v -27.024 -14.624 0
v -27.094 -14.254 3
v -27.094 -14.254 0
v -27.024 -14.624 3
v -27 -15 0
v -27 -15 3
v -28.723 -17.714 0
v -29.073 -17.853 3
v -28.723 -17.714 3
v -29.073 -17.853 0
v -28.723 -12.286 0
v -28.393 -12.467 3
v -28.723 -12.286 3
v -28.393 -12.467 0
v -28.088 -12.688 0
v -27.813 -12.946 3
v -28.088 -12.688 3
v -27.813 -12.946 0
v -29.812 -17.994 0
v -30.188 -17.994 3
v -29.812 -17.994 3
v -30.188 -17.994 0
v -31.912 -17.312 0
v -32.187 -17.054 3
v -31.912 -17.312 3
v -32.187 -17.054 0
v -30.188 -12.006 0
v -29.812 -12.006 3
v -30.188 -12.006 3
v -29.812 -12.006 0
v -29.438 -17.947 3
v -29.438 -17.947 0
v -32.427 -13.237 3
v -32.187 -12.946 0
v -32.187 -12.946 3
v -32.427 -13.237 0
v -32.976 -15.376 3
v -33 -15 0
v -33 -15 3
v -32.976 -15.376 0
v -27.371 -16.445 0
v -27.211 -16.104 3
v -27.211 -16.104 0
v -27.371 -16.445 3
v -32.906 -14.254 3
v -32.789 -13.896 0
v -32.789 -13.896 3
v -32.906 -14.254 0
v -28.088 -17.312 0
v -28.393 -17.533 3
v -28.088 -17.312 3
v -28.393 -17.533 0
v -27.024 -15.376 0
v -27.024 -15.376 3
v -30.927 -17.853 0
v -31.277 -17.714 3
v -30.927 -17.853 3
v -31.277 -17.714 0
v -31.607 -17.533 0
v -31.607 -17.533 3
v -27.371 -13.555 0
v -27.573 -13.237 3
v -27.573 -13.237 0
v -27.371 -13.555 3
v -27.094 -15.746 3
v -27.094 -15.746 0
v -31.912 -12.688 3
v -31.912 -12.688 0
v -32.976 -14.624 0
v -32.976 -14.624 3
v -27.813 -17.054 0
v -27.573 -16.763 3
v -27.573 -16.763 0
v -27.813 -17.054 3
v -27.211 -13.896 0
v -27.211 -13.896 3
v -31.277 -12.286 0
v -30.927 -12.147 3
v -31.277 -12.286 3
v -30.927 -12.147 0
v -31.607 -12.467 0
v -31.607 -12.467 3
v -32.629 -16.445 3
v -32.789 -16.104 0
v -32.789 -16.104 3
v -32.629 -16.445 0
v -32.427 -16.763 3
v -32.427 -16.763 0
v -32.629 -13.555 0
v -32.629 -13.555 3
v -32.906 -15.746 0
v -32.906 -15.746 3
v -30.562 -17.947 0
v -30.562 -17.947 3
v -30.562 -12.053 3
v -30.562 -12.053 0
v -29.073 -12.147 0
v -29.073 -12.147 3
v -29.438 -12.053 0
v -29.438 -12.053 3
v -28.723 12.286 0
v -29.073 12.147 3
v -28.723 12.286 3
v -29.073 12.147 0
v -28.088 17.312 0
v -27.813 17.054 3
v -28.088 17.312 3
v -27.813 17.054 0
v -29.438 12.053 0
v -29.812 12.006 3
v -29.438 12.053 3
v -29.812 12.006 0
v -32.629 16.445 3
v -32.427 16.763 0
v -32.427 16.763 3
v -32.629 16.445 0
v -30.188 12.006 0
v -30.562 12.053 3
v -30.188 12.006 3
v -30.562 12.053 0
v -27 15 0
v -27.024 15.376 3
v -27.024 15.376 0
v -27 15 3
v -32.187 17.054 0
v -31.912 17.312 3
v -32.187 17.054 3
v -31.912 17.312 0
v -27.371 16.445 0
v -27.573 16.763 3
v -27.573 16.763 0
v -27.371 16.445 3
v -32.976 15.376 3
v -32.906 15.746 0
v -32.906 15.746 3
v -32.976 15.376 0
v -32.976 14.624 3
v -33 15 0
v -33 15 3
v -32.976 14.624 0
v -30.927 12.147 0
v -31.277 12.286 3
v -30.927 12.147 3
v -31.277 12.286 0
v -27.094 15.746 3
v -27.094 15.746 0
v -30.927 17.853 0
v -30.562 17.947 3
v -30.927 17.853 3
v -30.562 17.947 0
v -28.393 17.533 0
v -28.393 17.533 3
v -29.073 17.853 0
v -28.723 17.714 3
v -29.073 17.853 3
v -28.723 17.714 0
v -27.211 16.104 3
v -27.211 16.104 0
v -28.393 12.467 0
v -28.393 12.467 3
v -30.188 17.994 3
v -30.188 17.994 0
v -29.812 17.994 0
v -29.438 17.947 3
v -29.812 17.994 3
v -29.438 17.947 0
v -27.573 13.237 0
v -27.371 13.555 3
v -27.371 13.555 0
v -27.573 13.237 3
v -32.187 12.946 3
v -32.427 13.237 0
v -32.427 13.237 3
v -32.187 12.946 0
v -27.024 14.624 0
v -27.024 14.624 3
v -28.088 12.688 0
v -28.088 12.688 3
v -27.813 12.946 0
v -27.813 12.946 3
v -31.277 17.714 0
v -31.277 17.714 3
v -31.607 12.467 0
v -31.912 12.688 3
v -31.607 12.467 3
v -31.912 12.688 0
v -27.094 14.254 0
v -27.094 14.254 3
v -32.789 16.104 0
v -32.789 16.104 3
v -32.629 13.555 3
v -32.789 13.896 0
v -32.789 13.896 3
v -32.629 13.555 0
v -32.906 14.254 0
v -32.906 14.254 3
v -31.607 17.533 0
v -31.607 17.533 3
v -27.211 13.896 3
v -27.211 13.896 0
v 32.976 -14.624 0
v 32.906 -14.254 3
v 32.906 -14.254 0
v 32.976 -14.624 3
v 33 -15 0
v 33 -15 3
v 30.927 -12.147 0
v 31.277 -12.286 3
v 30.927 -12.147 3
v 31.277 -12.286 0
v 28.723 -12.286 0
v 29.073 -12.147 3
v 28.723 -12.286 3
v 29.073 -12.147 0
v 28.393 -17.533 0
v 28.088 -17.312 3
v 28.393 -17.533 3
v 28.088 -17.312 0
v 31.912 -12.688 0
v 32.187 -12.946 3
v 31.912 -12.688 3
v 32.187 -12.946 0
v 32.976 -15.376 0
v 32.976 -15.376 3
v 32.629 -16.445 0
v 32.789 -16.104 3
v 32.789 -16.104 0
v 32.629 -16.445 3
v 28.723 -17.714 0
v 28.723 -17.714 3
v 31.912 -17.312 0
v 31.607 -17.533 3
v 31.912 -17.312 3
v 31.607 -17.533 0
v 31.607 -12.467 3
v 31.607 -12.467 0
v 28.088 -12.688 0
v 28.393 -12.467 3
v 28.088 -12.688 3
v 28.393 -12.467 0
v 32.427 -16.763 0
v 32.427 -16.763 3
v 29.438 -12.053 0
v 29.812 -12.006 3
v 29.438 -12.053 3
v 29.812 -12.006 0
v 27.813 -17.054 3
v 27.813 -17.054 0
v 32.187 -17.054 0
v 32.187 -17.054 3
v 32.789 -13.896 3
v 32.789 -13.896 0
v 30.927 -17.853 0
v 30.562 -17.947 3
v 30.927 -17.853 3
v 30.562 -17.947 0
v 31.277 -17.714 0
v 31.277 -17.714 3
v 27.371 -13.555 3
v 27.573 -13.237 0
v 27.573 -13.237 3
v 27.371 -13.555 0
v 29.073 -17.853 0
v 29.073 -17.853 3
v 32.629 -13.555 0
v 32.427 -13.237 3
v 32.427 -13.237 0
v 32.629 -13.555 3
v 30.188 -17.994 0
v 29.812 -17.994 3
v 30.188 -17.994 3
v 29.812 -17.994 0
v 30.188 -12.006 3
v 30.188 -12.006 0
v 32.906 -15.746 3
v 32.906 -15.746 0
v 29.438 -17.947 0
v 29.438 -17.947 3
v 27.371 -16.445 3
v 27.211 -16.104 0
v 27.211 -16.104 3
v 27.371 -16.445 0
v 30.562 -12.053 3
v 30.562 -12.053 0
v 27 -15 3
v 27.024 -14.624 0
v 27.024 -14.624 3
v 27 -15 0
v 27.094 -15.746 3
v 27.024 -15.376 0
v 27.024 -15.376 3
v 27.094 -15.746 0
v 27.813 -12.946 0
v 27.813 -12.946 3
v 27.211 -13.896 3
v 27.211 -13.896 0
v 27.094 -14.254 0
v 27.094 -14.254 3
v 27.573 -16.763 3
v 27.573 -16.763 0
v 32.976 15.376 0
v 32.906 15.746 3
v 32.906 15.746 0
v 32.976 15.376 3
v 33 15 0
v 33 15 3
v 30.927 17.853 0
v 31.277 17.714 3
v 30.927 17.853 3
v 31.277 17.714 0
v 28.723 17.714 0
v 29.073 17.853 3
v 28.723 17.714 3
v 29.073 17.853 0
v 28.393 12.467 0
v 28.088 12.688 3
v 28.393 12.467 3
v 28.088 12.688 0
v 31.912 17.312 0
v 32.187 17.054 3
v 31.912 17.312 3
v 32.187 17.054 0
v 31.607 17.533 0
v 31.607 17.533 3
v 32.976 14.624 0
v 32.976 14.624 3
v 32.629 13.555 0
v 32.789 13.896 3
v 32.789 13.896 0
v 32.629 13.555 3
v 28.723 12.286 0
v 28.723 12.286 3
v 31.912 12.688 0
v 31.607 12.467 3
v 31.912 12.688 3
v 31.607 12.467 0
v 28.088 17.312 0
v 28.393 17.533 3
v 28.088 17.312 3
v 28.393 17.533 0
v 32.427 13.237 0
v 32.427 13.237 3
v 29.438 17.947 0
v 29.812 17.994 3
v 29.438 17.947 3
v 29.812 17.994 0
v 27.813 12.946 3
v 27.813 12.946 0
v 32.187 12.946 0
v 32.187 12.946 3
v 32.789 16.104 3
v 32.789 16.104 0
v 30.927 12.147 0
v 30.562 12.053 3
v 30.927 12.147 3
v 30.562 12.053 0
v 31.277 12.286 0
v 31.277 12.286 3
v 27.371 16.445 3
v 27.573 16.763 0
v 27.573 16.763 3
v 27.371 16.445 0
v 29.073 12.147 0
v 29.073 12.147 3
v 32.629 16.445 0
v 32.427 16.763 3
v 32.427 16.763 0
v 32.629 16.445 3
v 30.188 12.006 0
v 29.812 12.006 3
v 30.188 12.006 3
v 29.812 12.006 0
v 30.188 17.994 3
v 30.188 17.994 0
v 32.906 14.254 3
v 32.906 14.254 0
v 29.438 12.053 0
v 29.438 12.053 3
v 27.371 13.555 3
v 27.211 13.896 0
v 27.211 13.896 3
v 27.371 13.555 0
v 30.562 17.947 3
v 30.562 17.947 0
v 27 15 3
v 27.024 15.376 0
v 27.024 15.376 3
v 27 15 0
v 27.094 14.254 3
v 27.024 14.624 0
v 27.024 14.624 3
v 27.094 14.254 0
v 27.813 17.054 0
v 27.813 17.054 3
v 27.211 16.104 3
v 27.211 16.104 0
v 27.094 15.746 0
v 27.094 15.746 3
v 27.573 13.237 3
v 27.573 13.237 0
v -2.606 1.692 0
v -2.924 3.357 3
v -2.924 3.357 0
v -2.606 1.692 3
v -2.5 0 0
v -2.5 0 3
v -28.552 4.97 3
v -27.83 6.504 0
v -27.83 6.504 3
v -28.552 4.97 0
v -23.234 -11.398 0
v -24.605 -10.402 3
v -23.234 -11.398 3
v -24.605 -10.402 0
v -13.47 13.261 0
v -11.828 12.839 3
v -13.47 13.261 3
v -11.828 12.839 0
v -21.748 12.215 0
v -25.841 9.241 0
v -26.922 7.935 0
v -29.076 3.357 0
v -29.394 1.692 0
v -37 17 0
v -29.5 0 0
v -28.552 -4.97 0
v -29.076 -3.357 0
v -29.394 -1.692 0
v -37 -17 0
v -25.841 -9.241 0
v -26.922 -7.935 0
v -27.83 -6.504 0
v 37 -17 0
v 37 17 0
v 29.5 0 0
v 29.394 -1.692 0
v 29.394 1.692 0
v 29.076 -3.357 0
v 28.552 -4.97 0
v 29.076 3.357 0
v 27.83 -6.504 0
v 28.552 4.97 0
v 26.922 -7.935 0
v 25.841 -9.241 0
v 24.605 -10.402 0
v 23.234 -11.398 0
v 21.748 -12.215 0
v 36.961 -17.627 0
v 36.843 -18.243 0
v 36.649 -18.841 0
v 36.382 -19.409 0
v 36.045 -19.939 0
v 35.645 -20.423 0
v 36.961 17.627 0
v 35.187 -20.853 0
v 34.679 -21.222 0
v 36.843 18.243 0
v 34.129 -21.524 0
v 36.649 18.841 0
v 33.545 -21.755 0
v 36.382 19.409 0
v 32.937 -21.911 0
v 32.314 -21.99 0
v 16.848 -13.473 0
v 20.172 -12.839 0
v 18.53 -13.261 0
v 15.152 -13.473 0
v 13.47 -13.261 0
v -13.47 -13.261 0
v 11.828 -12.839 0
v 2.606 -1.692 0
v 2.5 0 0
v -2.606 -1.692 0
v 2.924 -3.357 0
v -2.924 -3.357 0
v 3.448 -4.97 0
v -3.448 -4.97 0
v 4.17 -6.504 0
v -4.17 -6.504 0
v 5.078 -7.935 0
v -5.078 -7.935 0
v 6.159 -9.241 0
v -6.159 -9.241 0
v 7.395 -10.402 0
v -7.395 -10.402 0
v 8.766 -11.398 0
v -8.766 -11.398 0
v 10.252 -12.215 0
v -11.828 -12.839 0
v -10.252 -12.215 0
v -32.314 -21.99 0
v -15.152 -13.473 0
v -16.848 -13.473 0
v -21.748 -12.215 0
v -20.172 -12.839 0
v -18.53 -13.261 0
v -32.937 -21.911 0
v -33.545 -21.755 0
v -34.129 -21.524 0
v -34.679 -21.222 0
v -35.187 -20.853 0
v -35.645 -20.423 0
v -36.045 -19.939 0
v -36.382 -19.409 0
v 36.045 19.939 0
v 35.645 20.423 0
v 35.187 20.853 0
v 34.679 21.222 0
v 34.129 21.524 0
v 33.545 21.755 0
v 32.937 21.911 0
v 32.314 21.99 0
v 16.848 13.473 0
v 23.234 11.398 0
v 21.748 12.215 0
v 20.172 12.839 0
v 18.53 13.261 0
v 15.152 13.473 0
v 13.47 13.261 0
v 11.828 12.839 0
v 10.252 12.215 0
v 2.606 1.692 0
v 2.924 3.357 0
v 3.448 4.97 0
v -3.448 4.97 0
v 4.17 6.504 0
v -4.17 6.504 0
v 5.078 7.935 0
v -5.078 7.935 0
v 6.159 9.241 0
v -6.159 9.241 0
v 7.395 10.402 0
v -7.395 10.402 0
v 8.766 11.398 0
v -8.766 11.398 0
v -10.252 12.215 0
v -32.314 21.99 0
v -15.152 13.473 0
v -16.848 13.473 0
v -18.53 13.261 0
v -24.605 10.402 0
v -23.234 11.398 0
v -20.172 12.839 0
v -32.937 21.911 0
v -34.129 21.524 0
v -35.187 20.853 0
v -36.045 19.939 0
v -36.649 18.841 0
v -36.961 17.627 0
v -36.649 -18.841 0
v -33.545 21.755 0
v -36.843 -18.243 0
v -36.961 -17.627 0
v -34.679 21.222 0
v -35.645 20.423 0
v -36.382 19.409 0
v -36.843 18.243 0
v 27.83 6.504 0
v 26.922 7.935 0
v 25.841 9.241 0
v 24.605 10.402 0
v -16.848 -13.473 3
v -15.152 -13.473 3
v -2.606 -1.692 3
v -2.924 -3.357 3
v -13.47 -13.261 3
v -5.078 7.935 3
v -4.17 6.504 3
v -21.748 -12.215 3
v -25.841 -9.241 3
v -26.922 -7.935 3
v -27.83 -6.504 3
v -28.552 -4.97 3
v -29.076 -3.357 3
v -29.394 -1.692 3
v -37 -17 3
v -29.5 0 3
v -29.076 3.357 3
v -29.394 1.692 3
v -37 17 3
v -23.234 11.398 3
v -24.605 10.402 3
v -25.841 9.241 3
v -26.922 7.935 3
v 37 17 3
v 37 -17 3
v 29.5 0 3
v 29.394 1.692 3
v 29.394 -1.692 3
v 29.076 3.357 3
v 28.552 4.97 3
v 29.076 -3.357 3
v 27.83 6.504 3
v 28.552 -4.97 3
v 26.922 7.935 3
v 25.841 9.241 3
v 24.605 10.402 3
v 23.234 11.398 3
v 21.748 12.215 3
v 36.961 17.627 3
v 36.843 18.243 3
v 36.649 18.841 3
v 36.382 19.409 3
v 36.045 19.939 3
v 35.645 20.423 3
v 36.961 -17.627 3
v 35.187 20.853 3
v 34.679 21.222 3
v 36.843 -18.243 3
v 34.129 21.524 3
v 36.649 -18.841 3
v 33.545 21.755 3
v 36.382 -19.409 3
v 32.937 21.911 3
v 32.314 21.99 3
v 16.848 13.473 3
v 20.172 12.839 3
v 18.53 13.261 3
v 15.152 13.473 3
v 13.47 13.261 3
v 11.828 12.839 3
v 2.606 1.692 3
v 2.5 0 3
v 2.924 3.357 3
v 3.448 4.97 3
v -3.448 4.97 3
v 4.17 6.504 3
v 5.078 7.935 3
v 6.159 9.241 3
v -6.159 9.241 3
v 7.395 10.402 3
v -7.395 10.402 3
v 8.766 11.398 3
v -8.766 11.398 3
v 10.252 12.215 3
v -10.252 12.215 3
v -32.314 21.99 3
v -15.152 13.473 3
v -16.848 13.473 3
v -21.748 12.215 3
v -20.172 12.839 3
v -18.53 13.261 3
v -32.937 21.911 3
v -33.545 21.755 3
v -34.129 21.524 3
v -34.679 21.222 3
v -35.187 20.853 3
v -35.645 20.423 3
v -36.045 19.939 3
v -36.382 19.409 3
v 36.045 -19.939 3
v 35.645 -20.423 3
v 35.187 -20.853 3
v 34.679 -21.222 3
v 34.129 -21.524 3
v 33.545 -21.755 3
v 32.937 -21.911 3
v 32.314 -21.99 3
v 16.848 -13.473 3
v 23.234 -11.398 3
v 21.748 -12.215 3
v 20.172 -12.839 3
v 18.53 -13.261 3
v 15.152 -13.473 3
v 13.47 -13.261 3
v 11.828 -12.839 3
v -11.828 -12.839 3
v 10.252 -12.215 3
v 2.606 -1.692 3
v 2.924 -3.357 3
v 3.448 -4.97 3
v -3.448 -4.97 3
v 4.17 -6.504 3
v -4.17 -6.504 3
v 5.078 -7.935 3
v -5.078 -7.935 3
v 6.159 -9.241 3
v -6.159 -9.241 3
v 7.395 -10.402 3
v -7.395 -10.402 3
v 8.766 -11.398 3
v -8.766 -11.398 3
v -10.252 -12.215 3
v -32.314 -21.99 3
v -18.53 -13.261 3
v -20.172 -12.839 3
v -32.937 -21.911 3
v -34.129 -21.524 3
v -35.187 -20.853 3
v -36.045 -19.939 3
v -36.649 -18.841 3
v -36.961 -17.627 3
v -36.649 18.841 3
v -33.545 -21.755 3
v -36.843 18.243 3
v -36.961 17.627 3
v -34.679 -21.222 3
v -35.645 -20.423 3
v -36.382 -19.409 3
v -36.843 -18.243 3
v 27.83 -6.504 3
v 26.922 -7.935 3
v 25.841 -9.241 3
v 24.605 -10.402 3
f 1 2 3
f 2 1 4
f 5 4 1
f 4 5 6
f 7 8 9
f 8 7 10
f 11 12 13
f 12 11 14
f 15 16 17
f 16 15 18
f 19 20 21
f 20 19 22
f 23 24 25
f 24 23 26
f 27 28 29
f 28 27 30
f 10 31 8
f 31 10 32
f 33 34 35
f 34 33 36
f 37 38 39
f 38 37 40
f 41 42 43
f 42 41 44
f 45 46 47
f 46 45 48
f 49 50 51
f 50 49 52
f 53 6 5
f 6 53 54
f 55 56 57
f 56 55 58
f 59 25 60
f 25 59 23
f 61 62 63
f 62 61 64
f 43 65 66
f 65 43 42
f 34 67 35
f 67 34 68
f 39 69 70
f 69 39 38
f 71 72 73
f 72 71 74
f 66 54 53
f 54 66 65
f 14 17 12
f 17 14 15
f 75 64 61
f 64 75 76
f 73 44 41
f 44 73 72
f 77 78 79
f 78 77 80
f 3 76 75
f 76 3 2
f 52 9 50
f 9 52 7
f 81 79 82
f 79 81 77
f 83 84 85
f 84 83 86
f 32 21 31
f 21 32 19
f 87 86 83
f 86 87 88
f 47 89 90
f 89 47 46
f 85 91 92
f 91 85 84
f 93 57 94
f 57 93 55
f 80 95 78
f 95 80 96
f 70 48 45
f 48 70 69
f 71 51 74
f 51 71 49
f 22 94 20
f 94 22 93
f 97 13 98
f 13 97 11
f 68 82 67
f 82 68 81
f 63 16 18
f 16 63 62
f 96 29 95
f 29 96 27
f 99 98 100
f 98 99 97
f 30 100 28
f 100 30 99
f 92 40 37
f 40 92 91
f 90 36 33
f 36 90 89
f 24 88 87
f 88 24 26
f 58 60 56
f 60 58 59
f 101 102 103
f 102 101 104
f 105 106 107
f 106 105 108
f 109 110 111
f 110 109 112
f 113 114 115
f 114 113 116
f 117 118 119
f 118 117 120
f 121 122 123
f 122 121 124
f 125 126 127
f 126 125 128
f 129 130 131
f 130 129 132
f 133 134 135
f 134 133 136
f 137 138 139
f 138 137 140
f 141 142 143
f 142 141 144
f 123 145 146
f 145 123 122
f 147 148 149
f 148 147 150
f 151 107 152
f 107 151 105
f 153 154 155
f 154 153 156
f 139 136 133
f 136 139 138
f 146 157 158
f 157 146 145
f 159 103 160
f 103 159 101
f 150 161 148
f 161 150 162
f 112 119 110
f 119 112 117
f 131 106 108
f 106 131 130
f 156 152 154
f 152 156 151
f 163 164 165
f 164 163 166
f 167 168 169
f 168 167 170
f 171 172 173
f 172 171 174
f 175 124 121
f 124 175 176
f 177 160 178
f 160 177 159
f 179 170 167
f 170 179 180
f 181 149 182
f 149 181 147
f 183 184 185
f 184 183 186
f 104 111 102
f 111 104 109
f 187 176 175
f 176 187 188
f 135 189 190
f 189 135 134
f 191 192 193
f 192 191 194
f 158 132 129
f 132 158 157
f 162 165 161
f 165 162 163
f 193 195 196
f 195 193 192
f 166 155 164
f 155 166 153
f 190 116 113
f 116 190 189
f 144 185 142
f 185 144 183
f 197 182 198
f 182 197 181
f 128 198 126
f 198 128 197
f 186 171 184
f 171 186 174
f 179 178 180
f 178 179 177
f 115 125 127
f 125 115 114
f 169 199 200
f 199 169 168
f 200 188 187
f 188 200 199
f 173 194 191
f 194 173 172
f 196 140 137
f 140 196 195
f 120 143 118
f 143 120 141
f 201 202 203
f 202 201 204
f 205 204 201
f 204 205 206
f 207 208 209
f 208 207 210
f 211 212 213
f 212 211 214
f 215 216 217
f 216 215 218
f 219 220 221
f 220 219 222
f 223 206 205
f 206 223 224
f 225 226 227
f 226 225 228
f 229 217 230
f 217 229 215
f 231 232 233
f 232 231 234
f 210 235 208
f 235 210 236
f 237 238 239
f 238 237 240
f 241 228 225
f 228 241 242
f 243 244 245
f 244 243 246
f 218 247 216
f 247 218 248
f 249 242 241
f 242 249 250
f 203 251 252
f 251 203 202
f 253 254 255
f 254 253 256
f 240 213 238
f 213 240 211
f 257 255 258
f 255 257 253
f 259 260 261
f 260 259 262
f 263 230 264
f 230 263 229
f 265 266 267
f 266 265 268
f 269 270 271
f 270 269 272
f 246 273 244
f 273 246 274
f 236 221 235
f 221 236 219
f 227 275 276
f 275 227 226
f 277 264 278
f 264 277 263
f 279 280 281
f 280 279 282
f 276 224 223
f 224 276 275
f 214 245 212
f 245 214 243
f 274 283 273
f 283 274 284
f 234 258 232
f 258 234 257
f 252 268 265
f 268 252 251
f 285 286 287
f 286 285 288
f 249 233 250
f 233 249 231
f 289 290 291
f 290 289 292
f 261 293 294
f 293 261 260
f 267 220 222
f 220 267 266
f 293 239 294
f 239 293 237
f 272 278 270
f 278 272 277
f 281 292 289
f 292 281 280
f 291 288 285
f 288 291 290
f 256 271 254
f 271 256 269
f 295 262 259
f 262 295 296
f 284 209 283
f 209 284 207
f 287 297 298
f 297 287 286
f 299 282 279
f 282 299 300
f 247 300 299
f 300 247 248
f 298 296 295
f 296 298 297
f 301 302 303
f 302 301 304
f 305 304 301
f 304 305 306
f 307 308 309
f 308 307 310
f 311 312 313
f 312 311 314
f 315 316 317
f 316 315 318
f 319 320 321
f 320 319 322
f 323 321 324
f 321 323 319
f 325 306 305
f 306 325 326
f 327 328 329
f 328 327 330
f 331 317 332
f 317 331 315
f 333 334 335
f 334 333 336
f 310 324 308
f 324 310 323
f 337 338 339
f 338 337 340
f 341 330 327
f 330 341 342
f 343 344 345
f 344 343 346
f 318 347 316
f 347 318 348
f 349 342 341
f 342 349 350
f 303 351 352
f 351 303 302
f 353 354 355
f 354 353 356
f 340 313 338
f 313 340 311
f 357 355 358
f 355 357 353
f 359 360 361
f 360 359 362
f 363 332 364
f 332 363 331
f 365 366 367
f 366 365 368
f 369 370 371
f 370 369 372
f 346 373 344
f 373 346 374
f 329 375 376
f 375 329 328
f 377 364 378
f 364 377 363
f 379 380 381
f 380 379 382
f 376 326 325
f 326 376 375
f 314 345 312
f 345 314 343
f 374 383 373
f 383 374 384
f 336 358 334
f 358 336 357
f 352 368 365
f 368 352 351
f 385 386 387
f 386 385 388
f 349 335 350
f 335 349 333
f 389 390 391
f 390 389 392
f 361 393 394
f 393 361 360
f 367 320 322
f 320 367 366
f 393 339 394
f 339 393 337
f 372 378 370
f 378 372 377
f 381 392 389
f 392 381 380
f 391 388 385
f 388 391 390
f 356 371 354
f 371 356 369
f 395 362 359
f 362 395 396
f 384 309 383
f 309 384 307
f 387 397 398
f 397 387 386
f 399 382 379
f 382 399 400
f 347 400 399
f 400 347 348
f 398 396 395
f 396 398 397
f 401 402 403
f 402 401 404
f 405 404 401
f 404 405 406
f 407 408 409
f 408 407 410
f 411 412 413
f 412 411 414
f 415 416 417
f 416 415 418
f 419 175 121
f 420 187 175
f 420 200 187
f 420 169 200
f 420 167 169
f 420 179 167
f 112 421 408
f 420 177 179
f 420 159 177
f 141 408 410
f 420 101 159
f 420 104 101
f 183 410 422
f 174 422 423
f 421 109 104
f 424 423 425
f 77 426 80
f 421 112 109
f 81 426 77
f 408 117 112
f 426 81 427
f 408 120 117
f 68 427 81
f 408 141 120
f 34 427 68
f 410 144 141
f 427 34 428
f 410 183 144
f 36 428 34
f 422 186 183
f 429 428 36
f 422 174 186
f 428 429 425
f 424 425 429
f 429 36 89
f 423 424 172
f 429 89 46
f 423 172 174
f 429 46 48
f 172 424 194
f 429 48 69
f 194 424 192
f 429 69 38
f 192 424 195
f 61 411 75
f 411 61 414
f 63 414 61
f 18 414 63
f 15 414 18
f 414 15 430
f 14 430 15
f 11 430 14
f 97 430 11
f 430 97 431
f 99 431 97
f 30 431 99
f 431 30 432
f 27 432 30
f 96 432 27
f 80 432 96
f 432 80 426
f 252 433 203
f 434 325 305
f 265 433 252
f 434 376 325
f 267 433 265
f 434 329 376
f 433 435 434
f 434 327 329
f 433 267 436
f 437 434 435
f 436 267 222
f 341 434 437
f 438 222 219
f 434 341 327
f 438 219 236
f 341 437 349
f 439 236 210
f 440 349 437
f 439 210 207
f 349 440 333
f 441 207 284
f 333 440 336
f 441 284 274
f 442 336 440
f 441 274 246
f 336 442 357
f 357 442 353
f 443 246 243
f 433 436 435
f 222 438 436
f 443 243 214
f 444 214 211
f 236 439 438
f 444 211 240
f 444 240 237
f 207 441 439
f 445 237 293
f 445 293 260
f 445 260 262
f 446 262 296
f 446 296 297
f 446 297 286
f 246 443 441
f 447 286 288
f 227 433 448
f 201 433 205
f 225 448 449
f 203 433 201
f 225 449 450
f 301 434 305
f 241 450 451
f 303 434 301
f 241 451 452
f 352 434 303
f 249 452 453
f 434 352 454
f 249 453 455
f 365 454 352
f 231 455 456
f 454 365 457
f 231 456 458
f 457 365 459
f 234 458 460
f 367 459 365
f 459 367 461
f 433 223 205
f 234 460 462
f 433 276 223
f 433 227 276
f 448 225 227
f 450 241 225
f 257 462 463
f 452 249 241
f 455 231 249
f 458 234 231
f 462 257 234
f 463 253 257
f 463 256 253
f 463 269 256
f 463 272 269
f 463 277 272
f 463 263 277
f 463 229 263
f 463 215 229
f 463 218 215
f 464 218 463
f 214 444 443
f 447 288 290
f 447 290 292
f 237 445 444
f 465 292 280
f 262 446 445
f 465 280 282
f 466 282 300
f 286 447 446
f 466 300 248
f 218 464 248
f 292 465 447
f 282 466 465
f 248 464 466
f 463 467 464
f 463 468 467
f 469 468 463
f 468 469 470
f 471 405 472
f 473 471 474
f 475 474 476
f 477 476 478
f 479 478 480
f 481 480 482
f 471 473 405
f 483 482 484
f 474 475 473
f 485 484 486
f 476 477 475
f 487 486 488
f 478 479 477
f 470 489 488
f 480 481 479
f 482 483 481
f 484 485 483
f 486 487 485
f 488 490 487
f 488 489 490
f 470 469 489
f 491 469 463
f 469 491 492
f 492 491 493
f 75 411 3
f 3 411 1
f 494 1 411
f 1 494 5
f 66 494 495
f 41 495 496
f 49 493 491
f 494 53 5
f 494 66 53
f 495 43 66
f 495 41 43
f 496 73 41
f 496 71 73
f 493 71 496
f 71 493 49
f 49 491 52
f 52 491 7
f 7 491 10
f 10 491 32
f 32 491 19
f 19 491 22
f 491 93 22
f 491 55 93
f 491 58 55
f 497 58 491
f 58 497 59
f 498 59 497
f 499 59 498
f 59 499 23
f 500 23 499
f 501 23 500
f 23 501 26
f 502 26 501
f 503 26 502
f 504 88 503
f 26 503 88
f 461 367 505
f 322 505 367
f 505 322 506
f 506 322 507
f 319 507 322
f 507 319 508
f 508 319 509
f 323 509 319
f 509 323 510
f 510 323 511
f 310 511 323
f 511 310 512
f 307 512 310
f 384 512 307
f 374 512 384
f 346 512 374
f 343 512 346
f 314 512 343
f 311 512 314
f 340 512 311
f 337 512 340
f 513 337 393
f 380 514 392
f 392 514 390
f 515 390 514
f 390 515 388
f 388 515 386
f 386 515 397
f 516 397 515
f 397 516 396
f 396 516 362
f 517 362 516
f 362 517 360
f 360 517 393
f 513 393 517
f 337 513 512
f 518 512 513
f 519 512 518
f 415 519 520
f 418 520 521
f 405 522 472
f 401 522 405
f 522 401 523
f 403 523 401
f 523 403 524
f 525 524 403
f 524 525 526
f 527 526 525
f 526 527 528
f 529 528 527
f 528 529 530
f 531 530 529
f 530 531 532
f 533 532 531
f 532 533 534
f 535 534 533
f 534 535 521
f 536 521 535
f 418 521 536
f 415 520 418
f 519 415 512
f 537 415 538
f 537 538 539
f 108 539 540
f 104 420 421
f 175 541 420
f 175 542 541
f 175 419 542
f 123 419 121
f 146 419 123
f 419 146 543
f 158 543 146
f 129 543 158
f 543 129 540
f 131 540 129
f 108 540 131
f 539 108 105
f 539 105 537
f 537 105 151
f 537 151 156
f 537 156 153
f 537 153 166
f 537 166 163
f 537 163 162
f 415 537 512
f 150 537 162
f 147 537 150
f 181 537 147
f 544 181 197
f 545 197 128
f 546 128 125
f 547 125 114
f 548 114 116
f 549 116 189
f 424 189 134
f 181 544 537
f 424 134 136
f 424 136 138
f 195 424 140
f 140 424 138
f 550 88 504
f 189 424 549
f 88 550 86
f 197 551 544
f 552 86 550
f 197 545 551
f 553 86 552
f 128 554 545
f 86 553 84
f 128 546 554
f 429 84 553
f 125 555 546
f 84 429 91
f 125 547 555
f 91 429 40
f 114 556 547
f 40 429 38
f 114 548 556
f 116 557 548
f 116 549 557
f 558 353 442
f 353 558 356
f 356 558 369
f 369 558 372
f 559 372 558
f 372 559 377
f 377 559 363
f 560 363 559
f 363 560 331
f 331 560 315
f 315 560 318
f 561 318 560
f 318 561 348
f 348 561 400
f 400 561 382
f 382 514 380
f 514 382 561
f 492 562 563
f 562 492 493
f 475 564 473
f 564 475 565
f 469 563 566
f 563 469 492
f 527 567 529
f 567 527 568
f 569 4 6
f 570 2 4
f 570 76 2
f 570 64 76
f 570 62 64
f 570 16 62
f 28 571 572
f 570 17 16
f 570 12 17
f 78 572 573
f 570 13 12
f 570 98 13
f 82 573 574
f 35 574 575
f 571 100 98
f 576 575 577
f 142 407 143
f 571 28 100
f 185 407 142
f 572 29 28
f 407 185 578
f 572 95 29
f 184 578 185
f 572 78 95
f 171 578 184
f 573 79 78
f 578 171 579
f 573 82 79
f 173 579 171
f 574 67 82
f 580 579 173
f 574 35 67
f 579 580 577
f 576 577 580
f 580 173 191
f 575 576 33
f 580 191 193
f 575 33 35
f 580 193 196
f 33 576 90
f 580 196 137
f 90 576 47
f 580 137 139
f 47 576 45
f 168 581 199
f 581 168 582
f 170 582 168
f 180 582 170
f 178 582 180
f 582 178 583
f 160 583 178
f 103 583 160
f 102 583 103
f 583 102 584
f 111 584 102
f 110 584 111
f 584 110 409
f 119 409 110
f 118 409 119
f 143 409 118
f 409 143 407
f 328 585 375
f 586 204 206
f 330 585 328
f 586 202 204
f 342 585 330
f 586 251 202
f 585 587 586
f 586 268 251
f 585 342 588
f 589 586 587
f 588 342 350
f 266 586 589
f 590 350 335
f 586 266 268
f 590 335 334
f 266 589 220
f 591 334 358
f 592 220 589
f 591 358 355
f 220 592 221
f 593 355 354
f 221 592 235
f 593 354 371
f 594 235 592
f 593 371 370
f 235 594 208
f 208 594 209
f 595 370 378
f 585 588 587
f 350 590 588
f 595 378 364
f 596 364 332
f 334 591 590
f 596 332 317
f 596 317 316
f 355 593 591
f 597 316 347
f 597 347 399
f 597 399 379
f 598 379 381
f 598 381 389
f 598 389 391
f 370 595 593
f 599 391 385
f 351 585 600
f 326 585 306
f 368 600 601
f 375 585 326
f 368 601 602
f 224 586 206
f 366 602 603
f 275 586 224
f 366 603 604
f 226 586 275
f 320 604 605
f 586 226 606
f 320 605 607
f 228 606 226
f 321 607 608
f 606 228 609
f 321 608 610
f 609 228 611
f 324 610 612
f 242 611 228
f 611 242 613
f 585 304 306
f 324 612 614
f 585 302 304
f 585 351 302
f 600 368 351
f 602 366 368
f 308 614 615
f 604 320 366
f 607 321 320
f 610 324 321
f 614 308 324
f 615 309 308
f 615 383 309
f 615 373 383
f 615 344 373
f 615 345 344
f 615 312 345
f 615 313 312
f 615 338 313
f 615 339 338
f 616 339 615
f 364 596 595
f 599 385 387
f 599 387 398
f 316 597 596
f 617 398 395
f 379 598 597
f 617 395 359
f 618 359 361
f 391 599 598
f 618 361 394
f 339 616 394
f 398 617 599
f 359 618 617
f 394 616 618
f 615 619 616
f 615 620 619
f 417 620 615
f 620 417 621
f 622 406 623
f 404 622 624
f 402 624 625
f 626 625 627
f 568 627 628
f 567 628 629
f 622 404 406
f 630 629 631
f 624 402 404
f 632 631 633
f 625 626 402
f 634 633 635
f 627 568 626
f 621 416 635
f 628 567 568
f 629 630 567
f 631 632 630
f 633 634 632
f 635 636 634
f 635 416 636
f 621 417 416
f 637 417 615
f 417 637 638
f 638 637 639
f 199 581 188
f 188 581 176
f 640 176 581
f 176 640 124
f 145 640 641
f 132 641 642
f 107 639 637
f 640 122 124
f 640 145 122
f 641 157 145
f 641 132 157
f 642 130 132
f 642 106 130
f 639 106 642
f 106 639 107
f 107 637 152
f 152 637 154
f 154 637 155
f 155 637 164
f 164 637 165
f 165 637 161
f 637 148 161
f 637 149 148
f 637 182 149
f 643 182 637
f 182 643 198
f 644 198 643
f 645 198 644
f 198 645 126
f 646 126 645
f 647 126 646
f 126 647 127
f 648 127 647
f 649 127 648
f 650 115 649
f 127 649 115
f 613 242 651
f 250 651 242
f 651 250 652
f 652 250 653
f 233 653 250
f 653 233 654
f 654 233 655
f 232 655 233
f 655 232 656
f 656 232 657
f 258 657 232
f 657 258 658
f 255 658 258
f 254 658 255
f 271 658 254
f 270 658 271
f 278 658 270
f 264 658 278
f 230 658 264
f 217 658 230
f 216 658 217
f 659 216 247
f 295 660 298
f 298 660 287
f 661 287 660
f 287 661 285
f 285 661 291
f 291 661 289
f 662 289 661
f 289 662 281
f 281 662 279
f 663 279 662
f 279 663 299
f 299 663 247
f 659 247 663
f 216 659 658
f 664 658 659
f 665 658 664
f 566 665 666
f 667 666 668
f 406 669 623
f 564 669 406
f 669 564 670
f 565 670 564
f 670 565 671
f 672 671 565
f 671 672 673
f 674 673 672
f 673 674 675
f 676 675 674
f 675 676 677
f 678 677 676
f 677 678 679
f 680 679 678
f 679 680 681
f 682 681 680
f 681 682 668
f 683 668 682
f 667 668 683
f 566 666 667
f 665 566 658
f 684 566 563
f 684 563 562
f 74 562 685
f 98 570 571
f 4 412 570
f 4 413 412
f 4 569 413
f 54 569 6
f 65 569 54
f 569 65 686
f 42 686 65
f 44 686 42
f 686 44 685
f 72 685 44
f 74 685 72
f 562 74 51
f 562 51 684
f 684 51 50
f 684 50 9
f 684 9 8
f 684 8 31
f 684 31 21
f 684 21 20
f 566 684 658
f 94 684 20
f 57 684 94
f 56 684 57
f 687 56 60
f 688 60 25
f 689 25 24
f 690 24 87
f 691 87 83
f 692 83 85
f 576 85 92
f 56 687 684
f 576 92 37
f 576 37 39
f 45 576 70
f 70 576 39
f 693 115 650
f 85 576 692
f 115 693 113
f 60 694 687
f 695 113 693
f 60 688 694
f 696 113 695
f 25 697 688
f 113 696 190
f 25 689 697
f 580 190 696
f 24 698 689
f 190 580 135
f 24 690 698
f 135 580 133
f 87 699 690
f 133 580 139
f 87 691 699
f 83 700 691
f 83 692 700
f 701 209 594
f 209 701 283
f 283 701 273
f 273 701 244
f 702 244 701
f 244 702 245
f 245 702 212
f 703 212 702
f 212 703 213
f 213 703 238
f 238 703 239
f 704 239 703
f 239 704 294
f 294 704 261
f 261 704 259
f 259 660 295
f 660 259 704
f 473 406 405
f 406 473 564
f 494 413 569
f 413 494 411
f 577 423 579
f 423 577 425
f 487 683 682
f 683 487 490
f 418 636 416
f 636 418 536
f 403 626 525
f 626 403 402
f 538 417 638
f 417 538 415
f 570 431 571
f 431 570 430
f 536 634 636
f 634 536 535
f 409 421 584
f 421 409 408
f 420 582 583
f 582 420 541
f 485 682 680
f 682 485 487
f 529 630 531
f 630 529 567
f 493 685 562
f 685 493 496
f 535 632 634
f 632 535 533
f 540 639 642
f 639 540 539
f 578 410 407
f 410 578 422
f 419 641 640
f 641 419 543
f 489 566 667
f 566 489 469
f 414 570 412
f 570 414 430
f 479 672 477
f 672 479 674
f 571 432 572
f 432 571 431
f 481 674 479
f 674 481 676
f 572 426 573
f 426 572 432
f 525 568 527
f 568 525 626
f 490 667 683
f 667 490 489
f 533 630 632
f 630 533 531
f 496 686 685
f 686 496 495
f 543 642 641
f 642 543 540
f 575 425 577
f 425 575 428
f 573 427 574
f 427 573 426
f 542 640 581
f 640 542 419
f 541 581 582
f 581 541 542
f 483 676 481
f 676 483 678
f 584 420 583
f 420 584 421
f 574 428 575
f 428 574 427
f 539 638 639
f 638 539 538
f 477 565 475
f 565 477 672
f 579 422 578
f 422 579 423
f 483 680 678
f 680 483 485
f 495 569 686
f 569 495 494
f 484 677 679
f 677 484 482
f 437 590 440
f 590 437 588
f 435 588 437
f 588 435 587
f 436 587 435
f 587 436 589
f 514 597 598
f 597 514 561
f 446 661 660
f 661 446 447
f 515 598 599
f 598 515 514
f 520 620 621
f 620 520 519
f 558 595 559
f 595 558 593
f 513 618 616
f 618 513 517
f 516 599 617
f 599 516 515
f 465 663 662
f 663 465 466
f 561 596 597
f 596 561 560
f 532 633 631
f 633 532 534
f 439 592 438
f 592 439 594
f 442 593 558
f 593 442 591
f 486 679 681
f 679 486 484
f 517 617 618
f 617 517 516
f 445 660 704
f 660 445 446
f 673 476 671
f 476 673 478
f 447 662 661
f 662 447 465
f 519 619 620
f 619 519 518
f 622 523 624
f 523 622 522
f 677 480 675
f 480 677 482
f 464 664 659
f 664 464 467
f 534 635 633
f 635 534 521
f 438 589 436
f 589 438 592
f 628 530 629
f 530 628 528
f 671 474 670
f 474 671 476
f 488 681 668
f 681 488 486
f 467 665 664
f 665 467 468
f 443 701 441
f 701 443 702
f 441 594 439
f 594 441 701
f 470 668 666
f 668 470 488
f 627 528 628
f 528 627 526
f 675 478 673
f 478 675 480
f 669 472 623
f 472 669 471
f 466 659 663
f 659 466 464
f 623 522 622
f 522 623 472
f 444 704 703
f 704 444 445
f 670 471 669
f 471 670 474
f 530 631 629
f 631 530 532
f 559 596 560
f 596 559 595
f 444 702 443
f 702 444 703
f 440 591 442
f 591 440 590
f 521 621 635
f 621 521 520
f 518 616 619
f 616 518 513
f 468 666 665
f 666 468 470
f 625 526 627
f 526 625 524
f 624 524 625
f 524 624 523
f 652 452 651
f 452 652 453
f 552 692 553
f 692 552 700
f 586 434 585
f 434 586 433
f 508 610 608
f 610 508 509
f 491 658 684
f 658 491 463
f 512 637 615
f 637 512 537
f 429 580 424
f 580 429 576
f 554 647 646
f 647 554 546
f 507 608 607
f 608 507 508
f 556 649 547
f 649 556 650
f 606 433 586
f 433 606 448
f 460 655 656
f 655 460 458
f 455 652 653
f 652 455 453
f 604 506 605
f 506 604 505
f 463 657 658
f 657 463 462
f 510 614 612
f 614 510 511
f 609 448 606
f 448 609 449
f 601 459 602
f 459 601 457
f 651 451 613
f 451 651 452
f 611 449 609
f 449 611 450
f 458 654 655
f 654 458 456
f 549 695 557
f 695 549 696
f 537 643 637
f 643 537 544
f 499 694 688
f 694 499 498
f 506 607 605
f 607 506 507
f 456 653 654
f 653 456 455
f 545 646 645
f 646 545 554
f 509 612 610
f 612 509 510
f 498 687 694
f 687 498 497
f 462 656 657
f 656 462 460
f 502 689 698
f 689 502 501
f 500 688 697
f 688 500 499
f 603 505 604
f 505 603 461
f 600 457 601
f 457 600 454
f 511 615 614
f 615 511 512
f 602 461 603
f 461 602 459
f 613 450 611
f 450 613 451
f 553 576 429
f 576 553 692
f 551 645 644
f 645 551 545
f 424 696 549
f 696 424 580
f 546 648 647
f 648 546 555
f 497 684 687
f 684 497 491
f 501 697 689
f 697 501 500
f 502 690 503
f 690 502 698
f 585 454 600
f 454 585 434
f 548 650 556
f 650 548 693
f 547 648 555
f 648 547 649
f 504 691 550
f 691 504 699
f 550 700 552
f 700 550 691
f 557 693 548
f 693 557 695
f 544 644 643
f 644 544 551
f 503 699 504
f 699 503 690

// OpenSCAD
$fn = 50;


difference() {
	union() {
		hull() {
			translate(v = [-32.0000000000, 17.0000000000, 0]) {
				cylinder(h = 3, r = 5);
			}
			translate(v = [32.0000000000, 17.0000000000, 0]) {
				cylinder(h = 3, r = 5);
			}
			translate(v = [-32.0000000000, -17.0000000000, 0]) {
				cylinder(h = 3, r = 5);
			}
			translate(v = [32.0000000000, -17.0000000000, 0]) {
				cylinder(h = 3, r = 5);
			}
		}
	}
	union() {
		#translate(v = [-30.0000000000, -15.0000000000, -100.0000000000]) {
			cylinder(h = 200, r = 3.0000000000);
		}
		#translate(v = [-30.0000000000, 15.0000000000, -100.0000000000]) {
			cylinder(h = 200, r = 3.0000000000);
		}
		#translate(v = [30.0000000000, -15.0000000000, -100.0000000000]) {
			cylinder(h = 200, r = 3.0000000000);
		}
		#translate(v = [30.0000000000, 15.0000000000, -100.0000000000]) {
			cylinder(h = 200, r = 3.0000000000);
		}
		#translate(v = [-16.0000000000, 0, 0]) {
			cylinder(h = 3, r = 13.5000000000);
		}
		#translate(v = [16.0000000000, 0, 0]) {
			cylinder(h = 3, r = 13.5000000000);
		}
	}
}
